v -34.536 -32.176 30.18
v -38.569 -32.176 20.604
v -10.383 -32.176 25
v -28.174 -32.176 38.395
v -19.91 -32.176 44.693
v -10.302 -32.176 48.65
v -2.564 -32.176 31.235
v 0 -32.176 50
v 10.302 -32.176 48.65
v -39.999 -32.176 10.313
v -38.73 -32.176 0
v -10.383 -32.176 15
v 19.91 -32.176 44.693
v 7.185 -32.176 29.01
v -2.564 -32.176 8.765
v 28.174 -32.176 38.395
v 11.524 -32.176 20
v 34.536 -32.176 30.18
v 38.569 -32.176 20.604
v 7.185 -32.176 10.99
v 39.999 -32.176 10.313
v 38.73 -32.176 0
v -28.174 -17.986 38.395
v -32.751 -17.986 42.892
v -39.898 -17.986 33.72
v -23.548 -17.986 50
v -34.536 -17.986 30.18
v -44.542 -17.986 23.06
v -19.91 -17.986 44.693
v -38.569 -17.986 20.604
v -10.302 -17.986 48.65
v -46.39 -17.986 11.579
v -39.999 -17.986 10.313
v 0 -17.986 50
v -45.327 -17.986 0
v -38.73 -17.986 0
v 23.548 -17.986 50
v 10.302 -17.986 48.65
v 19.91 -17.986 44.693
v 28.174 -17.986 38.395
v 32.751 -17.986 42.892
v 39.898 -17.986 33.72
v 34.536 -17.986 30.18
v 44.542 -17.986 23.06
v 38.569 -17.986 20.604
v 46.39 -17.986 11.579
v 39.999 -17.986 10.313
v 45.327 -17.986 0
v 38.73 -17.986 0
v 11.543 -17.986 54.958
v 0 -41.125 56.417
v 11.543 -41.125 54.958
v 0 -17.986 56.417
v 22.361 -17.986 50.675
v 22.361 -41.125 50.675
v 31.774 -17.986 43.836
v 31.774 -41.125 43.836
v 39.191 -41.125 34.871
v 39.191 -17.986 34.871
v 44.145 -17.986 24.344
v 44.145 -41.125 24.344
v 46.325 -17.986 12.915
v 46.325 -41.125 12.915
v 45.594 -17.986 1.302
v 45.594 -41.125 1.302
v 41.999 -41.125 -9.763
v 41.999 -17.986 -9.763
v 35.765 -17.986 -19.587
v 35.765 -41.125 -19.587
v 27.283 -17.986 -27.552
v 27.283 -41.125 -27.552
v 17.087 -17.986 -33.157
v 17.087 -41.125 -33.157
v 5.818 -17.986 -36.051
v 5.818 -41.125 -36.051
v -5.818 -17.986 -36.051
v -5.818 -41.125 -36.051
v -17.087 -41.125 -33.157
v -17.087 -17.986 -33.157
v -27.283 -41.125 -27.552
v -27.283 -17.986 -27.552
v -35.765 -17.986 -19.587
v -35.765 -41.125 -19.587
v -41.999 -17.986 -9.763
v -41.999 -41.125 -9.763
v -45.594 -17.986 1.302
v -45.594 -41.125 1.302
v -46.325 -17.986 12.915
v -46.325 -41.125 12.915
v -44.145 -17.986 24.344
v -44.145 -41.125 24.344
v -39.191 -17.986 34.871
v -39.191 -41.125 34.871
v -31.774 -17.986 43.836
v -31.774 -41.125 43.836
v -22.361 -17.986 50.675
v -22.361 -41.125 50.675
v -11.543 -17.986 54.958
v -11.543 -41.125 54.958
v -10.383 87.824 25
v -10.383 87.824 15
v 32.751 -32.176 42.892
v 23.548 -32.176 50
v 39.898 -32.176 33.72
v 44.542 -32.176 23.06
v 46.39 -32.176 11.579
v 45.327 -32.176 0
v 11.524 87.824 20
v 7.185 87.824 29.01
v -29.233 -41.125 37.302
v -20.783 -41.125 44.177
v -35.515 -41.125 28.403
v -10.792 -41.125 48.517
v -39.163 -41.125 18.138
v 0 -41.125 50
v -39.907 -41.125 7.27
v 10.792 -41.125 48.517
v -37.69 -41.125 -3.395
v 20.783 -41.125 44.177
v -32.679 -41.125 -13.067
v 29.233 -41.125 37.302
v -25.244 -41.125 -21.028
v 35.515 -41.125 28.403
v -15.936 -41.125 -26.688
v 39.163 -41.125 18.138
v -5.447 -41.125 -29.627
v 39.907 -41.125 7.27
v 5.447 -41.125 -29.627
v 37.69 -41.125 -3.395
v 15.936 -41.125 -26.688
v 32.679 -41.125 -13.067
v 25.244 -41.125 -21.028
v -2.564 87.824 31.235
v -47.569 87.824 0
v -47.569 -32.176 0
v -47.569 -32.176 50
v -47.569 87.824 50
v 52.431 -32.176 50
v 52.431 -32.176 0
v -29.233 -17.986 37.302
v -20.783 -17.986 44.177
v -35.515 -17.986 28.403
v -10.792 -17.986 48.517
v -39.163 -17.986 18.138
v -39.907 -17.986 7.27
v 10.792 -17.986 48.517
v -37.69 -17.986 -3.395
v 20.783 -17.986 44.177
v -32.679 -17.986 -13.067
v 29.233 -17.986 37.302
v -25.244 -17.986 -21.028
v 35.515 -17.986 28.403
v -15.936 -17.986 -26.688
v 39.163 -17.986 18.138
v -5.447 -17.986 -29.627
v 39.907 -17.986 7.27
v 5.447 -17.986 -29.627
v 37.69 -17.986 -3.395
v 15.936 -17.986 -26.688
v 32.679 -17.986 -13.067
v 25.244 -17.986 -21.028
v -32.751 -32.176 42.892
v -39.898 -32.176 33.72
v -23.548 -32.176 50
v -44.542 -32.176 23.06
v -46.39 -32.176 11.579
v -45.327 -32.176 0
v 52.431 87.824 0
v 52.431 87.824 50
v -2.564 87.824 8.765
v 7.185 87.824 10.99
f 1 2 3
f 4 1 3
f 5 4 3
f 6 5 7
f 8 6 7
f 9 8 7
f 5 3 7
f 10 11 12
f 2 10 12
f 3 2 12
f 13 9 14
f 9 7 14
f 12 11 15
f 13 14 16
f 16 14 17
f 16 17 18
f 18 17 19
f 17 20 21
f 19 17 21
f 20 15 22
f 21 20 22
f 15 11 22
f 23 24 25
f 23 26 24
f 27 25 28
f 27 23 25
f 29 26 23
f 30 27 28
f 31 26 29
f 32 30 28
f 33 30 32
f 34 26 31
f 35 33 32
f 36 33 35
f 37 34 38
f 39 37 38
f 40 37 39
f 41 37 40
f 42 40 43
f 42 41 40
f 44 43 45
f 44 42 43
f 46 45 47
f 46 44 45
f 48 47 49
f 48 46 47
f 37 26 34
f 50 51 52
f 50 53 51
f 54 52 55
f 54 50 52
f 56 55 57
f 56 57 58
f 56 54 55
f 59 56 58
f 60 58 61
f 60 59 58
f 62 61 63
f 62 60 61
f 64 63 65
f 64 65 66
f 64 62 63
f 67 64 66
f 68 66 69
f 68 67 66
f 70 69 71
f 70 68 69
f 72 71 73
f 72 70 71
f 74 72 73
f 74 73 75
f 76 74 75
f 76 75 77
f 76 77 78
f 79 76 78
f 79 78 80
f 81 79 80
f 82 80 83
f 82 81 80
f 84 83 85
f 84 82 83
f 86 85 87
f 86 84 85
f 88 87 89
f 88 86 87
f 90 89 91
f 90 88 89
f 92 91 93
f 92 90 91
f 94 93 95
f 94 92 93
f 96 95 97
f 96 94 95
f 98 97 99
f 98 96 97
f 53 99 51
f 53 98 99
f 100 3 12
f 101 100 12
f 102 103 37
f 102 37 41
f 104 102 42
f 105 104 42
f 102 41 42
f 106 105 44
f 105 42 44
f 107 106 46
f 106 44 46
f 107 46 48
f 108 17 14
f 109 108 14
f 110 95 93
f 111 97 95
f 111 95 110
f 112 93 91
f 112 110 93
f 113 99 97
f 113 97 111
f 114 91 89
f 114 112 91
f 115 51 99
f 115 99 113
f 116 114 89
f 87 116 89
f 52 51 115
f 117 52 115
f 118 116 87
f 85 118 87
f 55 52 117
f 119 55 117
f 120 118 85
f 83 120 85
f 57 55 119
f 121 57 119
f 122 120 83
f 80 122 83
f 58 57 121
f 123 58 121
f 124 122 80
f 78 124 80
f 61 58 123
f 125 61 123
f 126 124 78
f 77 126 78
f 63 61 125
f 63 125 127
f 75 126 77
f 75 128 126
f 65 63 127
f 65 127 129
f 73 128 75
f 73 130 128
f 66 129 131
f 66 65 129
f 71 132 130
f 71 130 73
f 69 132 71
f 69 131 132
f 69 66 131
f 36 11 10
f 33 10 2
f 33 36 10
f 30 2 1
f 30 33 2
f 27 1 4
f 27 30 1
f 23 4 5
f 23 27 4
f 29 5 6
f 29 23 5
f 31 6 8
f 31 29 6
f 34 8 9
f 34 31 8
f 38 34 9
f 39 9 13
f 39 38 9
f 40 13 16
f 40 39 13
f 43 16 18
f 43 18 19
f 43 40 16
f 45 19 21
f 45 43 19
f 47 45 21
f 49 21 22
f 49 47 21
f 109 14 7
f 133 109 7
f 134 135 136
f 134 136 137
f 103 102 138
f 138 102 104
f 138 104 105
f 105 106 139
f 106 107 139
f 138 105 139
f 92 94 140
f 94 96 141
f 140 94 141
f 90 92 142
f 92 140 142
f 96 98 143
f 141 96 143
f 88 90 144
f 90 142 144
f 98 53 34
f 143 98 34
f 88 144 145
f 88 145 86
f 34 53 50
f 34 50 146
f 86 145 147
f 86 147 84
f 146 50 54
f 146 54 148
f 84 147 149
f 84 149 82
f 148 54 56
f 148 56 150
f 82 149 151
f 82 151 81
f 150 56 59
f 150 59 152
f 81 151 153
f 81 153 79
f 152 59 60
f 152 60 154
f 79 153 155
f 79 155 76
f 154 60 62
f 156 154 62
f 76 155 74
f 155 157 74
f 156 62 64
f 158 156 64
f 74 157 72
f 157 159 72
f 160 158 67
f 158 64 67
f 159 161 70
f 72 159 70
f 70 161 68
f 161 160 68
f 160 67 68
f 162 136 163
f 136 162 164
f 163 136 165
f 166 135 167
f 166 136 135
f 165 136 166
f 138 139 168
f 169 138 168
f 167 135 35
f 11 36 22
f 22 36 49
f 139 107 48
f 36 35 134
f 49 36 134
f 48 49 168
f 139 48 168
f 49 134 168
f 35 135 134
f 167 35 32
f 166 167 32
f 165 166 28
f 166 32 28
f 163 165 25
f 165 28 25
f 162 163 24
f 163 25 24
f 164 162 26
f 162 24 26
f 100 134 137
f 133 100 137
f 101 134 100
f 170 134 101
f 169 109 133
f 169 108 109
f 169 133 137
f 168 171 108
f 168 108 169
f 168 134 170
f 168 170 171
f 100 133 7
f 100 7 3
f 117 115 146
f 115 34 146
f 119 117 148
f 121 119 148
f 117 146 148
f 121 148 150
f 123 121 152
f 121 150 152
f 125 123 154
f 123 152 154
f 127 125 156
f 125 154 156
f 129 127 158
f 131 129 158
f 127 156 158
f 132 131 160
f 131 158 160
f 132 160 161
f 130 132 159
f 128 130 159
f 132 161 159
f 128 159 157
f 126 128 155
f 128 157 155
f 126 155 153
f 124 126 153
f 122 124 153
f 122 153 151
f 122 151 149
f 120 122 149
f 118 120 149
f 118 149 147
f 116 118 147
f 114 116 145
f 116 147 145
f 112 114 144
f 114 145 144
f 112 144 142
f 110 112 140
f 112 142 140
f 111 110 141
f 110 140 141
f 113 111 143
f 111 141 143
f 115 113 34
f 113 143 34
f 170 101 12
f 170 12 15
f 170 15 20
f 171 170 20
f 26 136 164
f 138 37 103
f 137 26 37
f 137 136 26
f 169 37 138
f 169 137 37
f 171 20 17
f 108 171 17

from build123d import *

# Parameters (mm, degrees)
F0_W     = 100
F0_H     = 120
F1_DEPTH = 50
F3_DEPTH = 120.001
F4_W     = 23.138892
F4_H     = 6.416667


with BuildPart() as f1:
    # F0 (on Top) → F1 (new body)
    with BuildSketch(Plane.XY):
        with Locations((2.430556, 27.823799)):
            Rectangle(F0_W, F0_H)
    extrude(amount=F1_DEPTH)

    # F2 (on face) → F3 (cut, through all)
    with BuildSketch(Plane.XZ.offset(32.176201)):
        Polygon((7.184987, 29.009689), (-2.564292, 31.234898), (-10.382607, 25), (-10.382607, 15), (-2.564292, 8.765102), (7.184987, 10.990311), (11.523824, 20), align=None)
    extrude(amount=-F3_DEPTH, mode=Mode.SUBTRACT)


with BuildPart() as f5:
    # F4 (on Right) → F5 (revolve)
    with BuildSketch(Plane.YZ):
        with Locations((-29.555557, 53.208333)):
            Rectangle(F4_W, F4_H)
    revolve(axis=Axis((0, -54.805739, 10), (0, 1, 0)))


with BuildPart() as f1_1:
    add(f1.part)

    # F6: cut F5
    add(f5.part, mode=Mode.SUBTRACT)


solid = Compound([f5.part, f1_1.part])
